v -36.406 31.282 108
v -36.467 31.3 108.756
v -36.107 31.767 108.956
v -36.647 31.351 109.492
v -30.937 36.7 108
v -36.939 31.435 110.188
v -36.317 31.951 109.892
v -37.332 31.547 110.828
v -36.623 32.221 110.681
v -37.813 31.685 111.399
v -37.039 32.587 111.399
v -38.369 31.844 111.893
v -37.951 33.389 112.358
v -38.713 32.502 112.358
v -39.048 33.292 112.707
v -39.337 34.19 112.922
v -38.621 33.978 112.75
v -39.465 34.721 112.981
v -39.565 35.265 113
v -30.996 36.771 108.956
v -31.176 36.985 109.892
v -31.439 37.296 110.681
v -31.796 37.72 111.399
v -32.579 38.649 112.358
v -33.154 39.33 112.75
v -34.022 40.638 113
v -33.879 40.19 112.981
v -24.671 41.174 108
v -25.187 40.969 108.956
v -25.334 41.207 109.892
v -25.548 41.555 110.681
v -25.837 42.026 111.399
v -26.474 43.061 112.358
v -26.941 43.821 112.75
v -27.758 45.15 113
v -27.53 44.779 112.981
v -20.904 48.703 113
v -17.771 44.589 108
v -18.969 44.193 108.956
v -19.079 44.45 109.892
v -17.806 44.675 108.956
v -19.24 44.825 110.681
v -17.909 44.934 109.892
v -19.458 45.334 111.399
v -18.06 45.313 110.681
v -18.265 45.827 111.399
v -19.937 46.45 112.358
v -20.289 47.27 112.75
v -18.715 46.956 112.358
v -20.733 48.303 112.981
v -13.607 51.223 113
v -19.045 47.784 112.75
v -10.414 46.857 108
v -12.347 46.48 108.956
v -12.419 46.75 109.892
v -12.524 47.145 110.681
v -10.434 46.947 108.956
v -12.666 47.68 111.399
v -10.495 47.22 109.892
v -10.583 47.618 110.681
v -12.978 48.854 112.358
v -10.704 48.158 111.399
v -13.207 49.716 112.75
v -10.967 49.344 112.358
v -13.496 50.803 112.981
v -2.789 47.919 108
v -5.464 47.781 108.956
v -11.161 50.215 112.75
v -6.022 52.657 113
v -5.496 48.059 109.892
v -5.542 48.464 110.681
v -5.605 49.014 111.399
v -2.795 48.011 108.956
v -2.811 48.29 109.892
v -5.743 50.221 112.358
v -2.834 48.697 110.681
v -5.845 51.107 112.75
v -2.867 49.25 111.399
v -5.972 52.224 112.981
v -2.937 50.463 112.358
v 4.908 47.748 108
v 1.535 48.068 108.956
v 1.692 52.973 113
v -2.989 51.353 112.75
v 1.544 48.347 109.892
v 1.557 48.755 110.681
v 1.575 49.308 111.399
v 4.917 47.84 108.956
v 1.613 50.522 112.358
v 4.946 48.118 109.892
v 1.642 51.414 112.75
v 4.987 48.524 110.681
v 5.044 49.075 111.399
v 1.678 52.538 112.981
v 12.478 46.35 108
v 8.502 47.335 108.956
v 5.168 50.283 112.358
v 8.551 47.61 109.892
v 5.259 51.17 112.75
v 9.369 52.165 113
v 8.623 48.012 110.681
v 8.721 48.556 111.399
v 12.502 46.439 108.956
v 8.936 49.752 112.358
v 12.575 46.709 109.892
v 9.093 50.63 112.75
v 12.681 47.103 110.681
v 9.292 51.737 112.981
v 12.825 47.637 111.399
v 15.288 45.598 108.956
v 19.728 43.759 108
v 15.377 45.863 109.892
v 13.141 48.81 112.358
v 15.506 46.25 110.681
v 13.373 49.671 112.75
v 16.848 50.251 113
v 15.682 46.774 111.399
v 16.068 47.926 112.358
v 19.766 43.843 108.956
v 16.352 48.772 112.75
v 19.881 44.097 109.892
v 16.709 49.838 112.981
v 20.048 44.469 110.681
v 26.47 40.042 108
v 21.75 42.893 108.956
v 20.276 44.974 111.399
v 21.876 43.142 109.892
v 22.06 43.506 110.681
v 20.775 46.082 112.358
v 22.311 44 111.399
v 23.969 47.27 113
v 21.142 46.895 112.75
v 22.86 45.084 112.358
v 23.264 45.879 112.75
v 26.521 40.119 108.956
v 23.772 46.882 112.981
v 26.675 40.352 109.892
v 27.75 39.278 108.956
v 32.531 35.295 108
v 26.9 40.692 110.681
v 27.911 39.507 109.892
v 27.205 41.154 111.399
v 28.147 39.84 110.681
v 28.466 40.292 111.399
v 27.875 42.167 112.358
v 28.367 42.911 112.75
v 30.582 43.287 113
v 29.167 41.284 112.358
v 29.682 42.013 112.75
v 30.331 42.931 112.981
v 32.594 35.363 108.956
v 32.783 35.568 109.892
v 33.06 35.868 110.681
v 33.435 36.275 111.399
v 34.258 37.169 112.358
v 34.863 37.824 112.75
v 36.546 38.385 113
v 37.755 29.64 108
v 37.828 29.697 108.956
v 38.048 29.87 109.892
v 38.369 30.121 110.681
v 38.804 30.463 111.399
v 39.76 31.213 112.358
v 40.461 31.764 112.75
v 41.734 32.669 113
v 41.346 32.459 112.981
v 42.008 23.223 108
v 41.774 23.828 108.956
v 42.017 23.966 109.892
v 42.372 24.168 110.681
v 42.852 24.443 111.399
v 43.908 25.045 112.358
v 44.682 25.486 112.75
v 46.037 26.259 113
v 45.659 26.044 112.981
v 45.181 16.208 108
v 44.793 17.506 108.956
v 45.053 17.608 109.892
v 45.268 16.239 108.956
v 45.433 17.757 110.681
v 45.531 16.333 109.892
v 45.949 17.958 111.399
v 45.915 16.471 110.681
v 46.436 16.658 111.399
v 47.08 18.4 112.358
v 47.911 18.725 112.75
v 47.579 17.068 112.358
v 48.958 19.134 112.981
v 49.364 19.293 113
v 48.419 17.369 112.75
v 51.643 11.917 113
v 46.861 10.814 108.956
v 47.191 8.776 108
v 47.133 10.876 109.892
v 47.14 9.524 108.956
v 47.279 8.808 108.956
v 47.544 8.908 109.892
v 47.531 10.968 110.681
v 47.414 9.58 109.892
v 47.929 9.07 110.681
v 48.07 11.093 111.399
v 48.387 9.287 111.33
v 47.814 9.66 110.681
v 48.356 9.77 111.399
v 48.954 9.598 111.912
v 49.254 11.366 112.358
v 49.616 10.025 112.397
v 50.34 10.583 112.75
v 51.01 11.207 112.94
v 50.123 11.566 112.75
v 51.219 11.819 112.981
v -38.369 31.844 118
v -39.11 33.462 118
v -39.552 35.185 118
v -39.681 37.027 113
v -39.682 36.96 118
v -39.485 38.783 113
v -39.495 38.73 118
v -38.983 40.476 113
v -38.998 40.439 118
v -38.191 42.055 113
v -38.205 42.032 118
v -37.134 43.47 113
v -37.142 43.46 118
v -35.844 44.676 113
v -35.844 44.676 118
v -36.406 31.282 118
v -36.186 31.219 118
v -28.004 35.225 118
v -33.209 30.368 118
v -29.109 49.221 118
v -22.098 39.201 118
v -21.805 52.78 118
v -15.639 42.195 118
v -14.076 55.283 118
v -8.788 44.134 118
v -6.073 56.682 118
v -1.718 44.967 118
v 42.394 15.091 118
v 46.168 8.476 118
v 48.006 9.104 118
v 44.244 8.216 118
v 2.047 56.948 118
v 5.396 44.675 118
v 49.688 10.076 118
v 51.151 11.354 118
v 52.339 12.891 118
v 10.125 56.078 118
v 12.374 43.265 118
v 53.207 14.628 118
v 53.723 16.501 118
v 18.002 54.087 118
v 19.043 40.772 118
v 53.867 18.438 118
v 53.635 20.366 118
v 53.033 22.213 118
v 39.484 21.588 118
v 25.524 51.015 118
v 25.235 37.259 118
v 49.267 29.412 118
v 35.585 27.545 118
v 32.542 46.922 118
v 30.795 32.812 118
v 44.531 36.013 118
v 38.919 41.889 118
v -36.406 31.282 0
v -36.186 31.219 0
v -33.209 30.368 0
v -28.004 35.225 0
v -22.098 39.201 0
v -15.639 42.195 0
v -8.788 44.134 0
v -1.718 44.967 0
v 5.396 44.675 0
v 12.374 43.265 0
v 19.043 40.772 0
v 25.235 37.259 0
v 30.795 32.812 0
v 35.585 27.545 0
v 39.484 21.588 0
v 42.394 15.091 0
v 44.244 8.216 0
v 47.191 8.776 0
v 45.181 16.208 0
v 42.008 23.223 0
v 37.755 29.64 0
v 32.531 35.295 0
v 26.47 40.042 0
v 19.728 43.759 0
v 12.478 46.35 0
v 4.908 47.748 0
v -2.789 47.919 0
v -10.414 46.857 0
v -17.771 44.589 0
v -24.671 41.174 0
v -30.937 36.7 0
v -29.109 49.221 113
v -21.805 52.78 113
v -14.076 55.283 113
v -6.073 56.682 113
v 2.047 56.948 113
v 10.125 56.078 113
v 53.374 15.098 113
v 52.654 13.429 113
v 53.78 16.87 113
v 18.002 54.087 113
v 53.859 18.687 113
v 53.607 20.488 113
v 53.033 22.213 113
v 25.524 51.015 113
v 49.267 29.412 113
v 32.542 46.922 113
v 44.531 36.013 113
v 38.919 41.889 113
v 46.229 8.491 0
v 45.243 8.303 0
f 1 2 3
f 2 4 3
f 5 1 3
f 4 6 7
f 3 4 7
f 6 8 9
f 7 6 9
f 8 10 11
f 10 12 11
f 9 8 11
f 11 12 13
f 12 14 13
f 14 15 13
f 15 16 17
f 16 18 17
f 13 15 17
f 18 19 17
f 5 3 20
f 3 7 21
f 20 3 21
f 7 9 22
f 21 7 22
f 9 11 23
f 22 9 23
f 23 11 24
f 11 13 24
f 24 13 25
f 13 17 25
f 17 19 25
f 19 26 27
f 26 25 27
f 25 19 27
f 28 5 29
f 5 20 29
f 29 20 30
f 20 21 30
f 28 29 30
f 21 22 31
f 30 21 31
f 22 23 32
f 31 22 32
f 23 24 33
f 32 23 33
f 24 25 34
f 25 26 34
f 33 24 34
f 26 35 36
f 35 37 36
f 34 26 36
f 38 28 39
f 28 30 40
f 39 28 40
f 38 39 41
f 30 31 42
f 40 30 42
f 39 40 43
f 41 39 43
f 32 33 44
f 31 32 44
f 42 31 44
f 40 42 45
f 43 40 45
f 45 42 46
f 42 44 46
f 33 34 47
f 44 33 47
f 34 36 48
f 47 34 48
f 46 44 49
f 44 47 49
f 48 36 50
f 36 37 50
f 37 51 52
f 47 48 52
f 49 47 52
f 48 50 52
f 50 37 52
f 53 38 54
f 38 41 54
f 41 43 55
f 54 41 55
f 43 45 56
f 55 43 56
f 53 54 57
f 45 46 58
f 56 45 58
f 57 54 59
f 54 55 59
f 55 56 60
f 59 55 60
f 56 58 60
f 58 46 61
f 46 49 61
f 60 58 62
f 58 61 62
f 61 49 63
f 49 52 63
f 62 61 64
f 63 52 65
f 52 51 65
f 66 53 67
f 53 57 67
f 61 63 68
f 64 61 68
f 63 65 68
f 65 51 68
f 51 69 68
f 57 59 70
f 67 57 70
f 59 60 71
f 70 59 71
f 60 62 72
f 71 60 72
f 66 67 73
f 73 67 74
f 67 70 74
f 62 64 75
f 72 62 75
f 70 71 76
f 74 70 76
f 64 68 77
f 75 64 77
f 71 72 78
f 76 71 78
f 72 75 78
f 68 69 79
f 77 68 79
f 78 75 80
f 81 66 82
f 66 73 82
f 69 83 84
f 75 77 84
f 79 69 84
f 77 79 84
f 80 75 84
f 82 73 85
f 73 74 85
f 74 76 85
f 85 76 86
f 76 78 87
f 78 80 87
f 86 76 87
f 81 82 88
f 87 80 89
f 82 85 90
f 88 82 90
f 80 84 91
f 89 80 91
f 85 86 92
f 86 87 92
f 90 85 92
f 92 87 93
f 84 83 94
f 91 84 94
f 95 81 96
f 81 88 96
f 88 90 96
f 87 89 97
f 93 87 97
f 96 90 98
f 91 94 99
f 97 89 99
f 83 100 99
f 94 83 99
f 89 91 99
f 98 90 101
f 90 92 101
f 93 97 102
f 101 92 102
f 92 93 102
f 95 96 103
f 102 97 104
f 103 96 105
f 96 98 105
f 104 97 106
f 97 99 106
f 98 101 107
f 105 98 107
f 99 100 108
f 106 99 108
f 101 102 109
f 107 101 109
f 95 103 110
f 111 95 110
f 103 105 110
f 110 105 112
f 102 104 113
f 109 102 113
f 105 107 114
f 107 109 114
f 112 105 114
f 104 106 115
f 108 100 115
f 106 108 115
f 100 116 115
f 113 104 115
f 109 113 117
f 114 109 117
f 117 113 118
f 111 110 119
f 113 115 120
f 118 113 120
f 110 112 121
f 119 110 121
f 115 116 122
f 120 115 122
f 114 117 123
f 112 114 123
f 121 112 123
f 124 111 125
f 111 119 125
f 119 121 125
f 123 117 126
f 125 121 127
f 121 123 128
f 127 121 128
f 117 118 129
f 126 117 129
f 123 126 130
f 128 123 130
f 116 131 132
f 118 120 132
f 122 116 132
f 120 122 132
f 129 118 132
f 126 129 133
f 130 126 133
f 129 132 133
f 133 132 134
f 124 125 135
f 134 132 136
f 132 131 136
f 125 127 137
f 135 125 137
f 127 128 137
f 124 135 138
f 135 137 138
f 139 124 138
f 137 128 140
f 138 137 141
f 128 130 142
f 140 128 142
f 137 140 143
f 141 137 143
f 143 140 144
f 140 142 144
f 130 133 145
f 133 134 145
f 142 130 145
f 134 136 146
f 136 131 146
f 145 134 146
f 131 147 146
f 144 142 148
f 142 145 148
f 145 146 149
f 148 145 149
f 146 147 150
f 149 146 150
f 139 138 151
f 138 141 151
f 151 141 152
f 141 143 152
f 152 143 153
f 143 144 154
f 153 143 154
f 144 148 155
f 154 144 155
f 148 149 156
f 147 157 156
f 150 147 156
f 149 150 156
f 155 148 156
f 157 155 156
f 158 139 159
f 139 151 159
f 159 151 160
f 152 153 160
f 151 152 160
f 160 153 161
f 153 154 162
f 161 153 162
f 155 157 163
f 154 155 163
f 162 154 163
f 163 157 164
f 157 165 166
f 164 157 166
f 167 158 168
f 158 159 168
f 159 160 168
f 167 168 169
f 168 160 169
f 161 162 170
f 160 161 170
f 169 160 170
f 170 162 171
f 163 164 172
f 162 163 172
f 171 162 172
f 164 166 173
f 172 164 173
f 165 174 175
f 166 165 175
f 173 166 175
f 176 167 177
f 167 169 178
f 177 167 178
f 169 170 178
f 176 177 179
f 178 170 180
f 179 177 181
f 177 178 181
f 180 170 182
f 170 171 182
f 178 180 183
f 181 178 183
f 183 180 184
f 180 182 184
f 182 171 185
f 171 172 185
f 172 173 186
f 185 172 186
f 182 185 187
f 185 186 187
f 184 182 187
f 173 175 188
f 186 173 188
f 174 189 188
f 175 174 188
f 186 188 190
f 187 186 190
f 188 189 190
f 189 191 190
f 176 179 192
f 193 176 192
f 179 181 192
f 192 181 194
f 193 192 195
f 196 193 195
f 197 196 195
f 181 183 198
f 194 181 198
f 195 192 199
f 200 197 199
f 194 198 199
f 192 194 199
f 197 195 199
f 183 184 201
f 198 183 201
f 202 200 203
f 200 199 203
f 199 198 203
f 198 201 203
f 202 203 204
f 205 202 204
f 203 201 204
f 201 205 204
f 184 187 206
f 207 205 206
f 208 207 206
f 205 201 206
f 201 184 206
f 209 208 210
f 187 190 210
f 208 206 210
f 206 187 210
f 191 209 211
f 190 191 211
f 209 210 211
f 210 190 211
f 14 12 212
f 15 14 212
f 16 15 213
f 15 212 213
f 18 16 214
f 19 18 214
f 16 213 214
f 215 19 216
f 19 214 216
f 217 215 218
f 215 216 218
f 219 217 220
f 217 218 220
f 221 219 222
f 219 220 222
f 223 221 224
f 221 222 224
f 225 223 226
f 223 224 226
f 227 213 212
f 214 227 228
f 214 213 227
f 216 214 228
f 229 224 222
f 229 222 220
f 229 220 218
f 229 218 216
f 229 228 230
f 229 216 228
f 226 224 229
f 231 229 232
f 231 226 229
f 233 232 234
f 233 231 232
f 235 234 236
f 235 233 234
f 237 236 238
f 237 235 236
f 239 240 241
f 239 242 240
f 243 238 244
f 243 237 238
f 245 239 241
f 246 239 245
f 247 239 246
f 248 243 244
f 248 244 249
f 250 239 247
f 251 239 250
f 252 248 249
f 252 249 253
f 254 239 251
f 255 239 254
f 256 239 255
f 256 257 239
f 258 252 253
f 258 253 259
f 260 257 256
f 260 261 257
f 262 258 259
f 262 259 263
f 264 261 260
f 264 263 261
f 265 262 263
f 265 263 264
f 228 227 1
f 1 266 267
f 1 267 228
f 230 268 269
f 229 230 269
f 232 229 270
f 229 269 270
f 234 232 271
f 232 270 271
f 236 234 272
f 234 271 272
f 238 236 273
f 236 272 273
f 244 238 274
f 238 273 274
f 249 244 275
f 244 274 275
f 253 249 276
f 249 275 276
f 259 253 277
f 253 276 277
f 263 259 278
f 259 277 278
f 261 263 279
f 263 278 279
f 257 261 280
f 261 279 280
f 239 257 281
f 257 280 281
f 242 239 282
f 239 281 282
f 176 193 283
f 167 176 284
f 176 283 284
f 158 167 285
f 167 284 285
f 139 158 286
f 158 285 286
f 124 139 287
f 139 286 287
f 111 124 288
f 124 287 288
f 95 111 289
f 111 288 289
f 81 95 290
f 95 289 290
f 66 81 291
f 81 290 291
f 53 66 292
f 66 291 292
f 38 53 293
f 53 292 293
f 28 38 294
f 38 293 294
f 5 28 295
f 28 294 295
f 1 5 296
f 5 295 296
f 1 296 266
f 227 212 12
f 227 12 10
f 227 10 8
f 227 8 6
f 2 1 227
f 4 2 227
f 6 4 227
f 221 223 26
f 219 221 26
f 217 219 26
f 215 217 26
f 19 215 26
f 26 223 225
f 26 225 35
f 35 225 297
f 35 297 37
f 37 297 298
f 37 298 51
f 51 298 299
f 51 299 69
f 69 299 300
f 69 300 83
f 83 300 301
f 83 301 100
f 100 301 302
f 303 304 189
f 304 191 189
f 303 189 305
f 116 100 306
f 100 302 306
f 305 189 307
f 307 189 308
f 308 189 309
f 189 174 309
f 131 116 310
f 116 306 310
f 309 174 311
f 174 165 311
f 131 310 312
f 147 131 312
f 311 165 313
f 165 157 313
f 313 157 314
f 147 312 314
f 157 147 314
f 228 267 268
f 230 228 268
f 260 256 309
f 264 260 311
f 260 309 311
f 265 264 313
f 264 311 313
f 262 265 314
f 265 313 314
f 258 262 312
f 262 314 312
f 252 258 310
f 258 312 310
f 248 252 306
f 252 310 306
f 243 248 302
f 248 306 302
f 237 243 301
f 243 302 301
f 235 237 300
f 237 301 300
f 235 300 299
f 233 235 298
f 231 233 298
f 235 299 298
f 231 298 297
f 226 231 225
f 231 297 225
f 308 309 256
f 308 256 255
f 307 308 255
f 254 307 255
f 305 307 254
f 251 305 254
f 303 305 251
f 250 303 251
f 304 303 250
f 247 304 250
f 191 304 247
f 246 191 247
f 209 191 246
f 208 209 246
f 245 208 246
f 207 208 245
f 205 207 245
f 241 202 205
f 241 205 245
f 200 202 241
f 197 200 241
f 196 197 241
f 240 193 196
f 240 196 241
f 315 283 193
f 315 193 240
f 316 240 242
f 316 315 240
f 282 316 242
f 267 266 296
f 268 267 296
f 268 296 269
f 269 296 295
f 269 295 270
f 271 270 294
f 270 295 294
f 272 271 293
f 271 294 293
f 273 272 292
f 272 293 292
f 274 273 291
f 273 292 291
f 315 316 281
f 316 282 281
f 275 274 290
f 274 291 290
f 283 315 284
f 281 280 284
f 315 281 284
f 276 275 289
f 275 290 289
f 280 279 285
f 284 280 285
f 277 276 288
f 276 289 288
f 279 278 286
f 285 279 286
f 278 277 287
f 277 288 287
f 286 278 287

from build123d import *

# Parameters (mm, degrees)
BOSS_EXTRU_1_DEPTH      = 118
BOSS_EXTRU_2_START      = -5
BOSS_EXTRU_2_DEPTH      = 5
CONG_1_R                = 5
ENL_V_MAT_EXTRU_2_DEPTH = 144.326668003
CONG_2_R                = 10
CONG_3_START            = -1
CONG_3_DEPTH            = 119


with BuildPart() as part:
    # Esquisse1 → Boss.-Extru.1 (new body)
    with BuildSketch(Plane.XY):
        with BuildLine():
            Line((-48, 0), (-44.998214382, -0.400877025))
            ThreePointArc((-44.998214382, -0.400877025), (5.956695581, 44.604010781), (43.316094217, -12.194916228))
            Line((43.316094217, -12.194916228), (46.317879834, -12.595793253))
            ThreePointArc((46.317879834, -12.595793253), (6.35380862, 47.5776115), (-48, 0))
        make_face()
    extrude(amount=BOSS_EXTRU_1_DEPTH)

    # Esquisse2 → Boss.-Extru.2 (add)
    with BuildSketch(Plane.XY.offset(118).offset(BOSS_EXTRU_2_START)):
        with BuildLine():
            Line((-58.058892958, 1.511889338), (-47.999984368, 0.038739081))
            ThreePointArc((-47.999984368, 0.038739081), (6.373007198, 47.57504366), (46.317879834, -12.595793253))
            Line((46.317879834, -12.595793253), (43.316094217, -12.194916228))
            Line((43.316094217, -12.194916228), (56.371627647, -14.179393207))
            ThreePointArc((56.371627647, -14.179393207), (7.76570592, 56.450860633), (-58.058892958, 1.511889338))
        make_face()
    extrude(amount=BOSS_EXTRU_2_DEPTH)

    # Congé1
    cong_1_edges = [part.edges().sort_by_distance(p)[0] for p in [
        (6.373007198, 47.57504366, 113),
    ]]
    fillet(cong_1_edges, radius=CONG_1_R)

    # Esquisse4 → Enlèv. mat.-Extru.2 (cut, through all)
    with BuildSketch(Plane(origin=(0, 0, 0), x_dir=(-1, 0, 0), z_dir=(0, 0, -1))):
        with BuildLine():
            ThreePointArc((-43.316094217, -12.194916228), (-44.953602713, -2.042939819), (-44.243666063, 8.215717453))
            Line((-44.243666063, 8.215717453), (-47.362132256, 7.799258183))
            ThreePointArc((-47.362132256, 7.799258183), (-47.93720577, -2.454445548), (-46.317879834, -12.595793253))
            Line((-46.317879834, -12.595793253), (-43.316094217, -12.194916228))
        make_face()
        with BuildLine():
            Line((33.208512529, 30.367658711), (-44.243666063, 8.215717453))
            ThreePointArc((-44.243666063, 8.215717453), (-44.953602713, -2.042939819), (-43.316094217, -12.194916228))
            Line((-43.316094217, -12.194916228), (-46.317879834, -12.595793253))
            ThreePointArc((-46.317879834, -12.595793253), (-47.93720577, -2.454445548), (-47.362132256, 7.799258183))
            Line((-47.362132256, 7.799258183), (-114.354421373, -1.147306612))
            Line((-114.354421373, -1.147306612), (-106.599475071, -56.082579824))
            Line((-106.599475071, -56.082579824), (62.827216074, -36.566785192))
            Line((62.827216074, -36.566785192), (101.490219992, -28.614943218))
            Line((101.490219992, -28.614943218), (87.117247585, 24.85835748))
            Line((87.117247585, 24.85835748), (83.033473236, 40.051658321))
            Line((83.033473236, 40.051658321), (38.369226529, 31.843664105))
            Line((38.369226529, 31.843664105), (36.40632276, 31.28225796))
            ThreePointArc((36.40632276, 31.28225796), (45.008351961, 16.680774975), (48, 0))
            Line((48, 0), (44.998214382, -0.400877025))
            ThreePointArc((44.998214382, -0.400877025), (42.020813074, 16.101281583), (33.208512529, 30.367658711))
        make_face()
        with BuildLine():
            Line((36.186144751, 31.219285292), (33.208512529, 30.367658711))
            ThreePointArc((33.208512529, 30.367658711), (42.020813074, 16.101281583), (44.998214382, -0.400877025))
            Line((44.998214382, -0.400877025), (48, 0))
            ThreePointArc((48, 0), (45.008351961, 16.680774975), (36.40632276, 31.28225796))
            Line((36.40632276, 31.28225796), (36.186144751, 31.219285292))
        make_face()
    extrude(amount=-ENL_V_MAT_EXTRU_2_DEPTH, mode=Mode.SUBTRACT)

    # Congé2
    # the kernel refuses this fillet: 10 mm, written as the material it takes off along each edge
    with BuildSketch(Plane(origin=(-46.806940355, 33.394271389, 157.328464208), x_dir=(0.6968989711094409, 0.7171693133888278, 0), z_dir=(0, 0, -1))) as cong_2_piece_1:
        with BuildLine():
            CenterArc((14.375231745, 9.907615581), CONG_2_R, 196.115404214, 81.678802413)
            Line((4.768186123, 7.131886052), (4.57604521, 7.076371462))
            ThreePointArc((4.57604521, 7.076371462), (2.21782943, 3.677102393), (-0.166263631, 0.111159367))
            Line((-0.166263631, 0.111159367), (-0.027123079, -0.198152312))
            ThreePointArc((-0.027123079, -0.198152312), (7.865692842, -0.735829632), (15.758508762, -0.198152312))
            Line((15.758508762, -0.198152312), (15.731385683, 0))
        make_face()
    extrude(amount=83.656928416, mode=Mode.SUBTRACT)

    # Congé3: read off the stored shape, not the designer's step
    # Congé3 outline → Congé3 (cut)
    with BuildSketch(Plane.XY.offset(CONG_3_START)):
        with BuildLine():
            ThreePointArc((57.403173546, 6.458315401), (55.776215181, 14.490369578), (53.03343531, 22.212936923))
            ThreePointArc((53.03343531, 22.212936923), (52.338794722, 12.890702035), (44.243666063, 8.215717453))
            Line((44.243666063, 8.215717453), (57.403173546, 6.458315401))
        make_face()
    extrude(amount=CONG_3_DEPTH, mode=Mode.SUBTRACT)


solid = part.part
